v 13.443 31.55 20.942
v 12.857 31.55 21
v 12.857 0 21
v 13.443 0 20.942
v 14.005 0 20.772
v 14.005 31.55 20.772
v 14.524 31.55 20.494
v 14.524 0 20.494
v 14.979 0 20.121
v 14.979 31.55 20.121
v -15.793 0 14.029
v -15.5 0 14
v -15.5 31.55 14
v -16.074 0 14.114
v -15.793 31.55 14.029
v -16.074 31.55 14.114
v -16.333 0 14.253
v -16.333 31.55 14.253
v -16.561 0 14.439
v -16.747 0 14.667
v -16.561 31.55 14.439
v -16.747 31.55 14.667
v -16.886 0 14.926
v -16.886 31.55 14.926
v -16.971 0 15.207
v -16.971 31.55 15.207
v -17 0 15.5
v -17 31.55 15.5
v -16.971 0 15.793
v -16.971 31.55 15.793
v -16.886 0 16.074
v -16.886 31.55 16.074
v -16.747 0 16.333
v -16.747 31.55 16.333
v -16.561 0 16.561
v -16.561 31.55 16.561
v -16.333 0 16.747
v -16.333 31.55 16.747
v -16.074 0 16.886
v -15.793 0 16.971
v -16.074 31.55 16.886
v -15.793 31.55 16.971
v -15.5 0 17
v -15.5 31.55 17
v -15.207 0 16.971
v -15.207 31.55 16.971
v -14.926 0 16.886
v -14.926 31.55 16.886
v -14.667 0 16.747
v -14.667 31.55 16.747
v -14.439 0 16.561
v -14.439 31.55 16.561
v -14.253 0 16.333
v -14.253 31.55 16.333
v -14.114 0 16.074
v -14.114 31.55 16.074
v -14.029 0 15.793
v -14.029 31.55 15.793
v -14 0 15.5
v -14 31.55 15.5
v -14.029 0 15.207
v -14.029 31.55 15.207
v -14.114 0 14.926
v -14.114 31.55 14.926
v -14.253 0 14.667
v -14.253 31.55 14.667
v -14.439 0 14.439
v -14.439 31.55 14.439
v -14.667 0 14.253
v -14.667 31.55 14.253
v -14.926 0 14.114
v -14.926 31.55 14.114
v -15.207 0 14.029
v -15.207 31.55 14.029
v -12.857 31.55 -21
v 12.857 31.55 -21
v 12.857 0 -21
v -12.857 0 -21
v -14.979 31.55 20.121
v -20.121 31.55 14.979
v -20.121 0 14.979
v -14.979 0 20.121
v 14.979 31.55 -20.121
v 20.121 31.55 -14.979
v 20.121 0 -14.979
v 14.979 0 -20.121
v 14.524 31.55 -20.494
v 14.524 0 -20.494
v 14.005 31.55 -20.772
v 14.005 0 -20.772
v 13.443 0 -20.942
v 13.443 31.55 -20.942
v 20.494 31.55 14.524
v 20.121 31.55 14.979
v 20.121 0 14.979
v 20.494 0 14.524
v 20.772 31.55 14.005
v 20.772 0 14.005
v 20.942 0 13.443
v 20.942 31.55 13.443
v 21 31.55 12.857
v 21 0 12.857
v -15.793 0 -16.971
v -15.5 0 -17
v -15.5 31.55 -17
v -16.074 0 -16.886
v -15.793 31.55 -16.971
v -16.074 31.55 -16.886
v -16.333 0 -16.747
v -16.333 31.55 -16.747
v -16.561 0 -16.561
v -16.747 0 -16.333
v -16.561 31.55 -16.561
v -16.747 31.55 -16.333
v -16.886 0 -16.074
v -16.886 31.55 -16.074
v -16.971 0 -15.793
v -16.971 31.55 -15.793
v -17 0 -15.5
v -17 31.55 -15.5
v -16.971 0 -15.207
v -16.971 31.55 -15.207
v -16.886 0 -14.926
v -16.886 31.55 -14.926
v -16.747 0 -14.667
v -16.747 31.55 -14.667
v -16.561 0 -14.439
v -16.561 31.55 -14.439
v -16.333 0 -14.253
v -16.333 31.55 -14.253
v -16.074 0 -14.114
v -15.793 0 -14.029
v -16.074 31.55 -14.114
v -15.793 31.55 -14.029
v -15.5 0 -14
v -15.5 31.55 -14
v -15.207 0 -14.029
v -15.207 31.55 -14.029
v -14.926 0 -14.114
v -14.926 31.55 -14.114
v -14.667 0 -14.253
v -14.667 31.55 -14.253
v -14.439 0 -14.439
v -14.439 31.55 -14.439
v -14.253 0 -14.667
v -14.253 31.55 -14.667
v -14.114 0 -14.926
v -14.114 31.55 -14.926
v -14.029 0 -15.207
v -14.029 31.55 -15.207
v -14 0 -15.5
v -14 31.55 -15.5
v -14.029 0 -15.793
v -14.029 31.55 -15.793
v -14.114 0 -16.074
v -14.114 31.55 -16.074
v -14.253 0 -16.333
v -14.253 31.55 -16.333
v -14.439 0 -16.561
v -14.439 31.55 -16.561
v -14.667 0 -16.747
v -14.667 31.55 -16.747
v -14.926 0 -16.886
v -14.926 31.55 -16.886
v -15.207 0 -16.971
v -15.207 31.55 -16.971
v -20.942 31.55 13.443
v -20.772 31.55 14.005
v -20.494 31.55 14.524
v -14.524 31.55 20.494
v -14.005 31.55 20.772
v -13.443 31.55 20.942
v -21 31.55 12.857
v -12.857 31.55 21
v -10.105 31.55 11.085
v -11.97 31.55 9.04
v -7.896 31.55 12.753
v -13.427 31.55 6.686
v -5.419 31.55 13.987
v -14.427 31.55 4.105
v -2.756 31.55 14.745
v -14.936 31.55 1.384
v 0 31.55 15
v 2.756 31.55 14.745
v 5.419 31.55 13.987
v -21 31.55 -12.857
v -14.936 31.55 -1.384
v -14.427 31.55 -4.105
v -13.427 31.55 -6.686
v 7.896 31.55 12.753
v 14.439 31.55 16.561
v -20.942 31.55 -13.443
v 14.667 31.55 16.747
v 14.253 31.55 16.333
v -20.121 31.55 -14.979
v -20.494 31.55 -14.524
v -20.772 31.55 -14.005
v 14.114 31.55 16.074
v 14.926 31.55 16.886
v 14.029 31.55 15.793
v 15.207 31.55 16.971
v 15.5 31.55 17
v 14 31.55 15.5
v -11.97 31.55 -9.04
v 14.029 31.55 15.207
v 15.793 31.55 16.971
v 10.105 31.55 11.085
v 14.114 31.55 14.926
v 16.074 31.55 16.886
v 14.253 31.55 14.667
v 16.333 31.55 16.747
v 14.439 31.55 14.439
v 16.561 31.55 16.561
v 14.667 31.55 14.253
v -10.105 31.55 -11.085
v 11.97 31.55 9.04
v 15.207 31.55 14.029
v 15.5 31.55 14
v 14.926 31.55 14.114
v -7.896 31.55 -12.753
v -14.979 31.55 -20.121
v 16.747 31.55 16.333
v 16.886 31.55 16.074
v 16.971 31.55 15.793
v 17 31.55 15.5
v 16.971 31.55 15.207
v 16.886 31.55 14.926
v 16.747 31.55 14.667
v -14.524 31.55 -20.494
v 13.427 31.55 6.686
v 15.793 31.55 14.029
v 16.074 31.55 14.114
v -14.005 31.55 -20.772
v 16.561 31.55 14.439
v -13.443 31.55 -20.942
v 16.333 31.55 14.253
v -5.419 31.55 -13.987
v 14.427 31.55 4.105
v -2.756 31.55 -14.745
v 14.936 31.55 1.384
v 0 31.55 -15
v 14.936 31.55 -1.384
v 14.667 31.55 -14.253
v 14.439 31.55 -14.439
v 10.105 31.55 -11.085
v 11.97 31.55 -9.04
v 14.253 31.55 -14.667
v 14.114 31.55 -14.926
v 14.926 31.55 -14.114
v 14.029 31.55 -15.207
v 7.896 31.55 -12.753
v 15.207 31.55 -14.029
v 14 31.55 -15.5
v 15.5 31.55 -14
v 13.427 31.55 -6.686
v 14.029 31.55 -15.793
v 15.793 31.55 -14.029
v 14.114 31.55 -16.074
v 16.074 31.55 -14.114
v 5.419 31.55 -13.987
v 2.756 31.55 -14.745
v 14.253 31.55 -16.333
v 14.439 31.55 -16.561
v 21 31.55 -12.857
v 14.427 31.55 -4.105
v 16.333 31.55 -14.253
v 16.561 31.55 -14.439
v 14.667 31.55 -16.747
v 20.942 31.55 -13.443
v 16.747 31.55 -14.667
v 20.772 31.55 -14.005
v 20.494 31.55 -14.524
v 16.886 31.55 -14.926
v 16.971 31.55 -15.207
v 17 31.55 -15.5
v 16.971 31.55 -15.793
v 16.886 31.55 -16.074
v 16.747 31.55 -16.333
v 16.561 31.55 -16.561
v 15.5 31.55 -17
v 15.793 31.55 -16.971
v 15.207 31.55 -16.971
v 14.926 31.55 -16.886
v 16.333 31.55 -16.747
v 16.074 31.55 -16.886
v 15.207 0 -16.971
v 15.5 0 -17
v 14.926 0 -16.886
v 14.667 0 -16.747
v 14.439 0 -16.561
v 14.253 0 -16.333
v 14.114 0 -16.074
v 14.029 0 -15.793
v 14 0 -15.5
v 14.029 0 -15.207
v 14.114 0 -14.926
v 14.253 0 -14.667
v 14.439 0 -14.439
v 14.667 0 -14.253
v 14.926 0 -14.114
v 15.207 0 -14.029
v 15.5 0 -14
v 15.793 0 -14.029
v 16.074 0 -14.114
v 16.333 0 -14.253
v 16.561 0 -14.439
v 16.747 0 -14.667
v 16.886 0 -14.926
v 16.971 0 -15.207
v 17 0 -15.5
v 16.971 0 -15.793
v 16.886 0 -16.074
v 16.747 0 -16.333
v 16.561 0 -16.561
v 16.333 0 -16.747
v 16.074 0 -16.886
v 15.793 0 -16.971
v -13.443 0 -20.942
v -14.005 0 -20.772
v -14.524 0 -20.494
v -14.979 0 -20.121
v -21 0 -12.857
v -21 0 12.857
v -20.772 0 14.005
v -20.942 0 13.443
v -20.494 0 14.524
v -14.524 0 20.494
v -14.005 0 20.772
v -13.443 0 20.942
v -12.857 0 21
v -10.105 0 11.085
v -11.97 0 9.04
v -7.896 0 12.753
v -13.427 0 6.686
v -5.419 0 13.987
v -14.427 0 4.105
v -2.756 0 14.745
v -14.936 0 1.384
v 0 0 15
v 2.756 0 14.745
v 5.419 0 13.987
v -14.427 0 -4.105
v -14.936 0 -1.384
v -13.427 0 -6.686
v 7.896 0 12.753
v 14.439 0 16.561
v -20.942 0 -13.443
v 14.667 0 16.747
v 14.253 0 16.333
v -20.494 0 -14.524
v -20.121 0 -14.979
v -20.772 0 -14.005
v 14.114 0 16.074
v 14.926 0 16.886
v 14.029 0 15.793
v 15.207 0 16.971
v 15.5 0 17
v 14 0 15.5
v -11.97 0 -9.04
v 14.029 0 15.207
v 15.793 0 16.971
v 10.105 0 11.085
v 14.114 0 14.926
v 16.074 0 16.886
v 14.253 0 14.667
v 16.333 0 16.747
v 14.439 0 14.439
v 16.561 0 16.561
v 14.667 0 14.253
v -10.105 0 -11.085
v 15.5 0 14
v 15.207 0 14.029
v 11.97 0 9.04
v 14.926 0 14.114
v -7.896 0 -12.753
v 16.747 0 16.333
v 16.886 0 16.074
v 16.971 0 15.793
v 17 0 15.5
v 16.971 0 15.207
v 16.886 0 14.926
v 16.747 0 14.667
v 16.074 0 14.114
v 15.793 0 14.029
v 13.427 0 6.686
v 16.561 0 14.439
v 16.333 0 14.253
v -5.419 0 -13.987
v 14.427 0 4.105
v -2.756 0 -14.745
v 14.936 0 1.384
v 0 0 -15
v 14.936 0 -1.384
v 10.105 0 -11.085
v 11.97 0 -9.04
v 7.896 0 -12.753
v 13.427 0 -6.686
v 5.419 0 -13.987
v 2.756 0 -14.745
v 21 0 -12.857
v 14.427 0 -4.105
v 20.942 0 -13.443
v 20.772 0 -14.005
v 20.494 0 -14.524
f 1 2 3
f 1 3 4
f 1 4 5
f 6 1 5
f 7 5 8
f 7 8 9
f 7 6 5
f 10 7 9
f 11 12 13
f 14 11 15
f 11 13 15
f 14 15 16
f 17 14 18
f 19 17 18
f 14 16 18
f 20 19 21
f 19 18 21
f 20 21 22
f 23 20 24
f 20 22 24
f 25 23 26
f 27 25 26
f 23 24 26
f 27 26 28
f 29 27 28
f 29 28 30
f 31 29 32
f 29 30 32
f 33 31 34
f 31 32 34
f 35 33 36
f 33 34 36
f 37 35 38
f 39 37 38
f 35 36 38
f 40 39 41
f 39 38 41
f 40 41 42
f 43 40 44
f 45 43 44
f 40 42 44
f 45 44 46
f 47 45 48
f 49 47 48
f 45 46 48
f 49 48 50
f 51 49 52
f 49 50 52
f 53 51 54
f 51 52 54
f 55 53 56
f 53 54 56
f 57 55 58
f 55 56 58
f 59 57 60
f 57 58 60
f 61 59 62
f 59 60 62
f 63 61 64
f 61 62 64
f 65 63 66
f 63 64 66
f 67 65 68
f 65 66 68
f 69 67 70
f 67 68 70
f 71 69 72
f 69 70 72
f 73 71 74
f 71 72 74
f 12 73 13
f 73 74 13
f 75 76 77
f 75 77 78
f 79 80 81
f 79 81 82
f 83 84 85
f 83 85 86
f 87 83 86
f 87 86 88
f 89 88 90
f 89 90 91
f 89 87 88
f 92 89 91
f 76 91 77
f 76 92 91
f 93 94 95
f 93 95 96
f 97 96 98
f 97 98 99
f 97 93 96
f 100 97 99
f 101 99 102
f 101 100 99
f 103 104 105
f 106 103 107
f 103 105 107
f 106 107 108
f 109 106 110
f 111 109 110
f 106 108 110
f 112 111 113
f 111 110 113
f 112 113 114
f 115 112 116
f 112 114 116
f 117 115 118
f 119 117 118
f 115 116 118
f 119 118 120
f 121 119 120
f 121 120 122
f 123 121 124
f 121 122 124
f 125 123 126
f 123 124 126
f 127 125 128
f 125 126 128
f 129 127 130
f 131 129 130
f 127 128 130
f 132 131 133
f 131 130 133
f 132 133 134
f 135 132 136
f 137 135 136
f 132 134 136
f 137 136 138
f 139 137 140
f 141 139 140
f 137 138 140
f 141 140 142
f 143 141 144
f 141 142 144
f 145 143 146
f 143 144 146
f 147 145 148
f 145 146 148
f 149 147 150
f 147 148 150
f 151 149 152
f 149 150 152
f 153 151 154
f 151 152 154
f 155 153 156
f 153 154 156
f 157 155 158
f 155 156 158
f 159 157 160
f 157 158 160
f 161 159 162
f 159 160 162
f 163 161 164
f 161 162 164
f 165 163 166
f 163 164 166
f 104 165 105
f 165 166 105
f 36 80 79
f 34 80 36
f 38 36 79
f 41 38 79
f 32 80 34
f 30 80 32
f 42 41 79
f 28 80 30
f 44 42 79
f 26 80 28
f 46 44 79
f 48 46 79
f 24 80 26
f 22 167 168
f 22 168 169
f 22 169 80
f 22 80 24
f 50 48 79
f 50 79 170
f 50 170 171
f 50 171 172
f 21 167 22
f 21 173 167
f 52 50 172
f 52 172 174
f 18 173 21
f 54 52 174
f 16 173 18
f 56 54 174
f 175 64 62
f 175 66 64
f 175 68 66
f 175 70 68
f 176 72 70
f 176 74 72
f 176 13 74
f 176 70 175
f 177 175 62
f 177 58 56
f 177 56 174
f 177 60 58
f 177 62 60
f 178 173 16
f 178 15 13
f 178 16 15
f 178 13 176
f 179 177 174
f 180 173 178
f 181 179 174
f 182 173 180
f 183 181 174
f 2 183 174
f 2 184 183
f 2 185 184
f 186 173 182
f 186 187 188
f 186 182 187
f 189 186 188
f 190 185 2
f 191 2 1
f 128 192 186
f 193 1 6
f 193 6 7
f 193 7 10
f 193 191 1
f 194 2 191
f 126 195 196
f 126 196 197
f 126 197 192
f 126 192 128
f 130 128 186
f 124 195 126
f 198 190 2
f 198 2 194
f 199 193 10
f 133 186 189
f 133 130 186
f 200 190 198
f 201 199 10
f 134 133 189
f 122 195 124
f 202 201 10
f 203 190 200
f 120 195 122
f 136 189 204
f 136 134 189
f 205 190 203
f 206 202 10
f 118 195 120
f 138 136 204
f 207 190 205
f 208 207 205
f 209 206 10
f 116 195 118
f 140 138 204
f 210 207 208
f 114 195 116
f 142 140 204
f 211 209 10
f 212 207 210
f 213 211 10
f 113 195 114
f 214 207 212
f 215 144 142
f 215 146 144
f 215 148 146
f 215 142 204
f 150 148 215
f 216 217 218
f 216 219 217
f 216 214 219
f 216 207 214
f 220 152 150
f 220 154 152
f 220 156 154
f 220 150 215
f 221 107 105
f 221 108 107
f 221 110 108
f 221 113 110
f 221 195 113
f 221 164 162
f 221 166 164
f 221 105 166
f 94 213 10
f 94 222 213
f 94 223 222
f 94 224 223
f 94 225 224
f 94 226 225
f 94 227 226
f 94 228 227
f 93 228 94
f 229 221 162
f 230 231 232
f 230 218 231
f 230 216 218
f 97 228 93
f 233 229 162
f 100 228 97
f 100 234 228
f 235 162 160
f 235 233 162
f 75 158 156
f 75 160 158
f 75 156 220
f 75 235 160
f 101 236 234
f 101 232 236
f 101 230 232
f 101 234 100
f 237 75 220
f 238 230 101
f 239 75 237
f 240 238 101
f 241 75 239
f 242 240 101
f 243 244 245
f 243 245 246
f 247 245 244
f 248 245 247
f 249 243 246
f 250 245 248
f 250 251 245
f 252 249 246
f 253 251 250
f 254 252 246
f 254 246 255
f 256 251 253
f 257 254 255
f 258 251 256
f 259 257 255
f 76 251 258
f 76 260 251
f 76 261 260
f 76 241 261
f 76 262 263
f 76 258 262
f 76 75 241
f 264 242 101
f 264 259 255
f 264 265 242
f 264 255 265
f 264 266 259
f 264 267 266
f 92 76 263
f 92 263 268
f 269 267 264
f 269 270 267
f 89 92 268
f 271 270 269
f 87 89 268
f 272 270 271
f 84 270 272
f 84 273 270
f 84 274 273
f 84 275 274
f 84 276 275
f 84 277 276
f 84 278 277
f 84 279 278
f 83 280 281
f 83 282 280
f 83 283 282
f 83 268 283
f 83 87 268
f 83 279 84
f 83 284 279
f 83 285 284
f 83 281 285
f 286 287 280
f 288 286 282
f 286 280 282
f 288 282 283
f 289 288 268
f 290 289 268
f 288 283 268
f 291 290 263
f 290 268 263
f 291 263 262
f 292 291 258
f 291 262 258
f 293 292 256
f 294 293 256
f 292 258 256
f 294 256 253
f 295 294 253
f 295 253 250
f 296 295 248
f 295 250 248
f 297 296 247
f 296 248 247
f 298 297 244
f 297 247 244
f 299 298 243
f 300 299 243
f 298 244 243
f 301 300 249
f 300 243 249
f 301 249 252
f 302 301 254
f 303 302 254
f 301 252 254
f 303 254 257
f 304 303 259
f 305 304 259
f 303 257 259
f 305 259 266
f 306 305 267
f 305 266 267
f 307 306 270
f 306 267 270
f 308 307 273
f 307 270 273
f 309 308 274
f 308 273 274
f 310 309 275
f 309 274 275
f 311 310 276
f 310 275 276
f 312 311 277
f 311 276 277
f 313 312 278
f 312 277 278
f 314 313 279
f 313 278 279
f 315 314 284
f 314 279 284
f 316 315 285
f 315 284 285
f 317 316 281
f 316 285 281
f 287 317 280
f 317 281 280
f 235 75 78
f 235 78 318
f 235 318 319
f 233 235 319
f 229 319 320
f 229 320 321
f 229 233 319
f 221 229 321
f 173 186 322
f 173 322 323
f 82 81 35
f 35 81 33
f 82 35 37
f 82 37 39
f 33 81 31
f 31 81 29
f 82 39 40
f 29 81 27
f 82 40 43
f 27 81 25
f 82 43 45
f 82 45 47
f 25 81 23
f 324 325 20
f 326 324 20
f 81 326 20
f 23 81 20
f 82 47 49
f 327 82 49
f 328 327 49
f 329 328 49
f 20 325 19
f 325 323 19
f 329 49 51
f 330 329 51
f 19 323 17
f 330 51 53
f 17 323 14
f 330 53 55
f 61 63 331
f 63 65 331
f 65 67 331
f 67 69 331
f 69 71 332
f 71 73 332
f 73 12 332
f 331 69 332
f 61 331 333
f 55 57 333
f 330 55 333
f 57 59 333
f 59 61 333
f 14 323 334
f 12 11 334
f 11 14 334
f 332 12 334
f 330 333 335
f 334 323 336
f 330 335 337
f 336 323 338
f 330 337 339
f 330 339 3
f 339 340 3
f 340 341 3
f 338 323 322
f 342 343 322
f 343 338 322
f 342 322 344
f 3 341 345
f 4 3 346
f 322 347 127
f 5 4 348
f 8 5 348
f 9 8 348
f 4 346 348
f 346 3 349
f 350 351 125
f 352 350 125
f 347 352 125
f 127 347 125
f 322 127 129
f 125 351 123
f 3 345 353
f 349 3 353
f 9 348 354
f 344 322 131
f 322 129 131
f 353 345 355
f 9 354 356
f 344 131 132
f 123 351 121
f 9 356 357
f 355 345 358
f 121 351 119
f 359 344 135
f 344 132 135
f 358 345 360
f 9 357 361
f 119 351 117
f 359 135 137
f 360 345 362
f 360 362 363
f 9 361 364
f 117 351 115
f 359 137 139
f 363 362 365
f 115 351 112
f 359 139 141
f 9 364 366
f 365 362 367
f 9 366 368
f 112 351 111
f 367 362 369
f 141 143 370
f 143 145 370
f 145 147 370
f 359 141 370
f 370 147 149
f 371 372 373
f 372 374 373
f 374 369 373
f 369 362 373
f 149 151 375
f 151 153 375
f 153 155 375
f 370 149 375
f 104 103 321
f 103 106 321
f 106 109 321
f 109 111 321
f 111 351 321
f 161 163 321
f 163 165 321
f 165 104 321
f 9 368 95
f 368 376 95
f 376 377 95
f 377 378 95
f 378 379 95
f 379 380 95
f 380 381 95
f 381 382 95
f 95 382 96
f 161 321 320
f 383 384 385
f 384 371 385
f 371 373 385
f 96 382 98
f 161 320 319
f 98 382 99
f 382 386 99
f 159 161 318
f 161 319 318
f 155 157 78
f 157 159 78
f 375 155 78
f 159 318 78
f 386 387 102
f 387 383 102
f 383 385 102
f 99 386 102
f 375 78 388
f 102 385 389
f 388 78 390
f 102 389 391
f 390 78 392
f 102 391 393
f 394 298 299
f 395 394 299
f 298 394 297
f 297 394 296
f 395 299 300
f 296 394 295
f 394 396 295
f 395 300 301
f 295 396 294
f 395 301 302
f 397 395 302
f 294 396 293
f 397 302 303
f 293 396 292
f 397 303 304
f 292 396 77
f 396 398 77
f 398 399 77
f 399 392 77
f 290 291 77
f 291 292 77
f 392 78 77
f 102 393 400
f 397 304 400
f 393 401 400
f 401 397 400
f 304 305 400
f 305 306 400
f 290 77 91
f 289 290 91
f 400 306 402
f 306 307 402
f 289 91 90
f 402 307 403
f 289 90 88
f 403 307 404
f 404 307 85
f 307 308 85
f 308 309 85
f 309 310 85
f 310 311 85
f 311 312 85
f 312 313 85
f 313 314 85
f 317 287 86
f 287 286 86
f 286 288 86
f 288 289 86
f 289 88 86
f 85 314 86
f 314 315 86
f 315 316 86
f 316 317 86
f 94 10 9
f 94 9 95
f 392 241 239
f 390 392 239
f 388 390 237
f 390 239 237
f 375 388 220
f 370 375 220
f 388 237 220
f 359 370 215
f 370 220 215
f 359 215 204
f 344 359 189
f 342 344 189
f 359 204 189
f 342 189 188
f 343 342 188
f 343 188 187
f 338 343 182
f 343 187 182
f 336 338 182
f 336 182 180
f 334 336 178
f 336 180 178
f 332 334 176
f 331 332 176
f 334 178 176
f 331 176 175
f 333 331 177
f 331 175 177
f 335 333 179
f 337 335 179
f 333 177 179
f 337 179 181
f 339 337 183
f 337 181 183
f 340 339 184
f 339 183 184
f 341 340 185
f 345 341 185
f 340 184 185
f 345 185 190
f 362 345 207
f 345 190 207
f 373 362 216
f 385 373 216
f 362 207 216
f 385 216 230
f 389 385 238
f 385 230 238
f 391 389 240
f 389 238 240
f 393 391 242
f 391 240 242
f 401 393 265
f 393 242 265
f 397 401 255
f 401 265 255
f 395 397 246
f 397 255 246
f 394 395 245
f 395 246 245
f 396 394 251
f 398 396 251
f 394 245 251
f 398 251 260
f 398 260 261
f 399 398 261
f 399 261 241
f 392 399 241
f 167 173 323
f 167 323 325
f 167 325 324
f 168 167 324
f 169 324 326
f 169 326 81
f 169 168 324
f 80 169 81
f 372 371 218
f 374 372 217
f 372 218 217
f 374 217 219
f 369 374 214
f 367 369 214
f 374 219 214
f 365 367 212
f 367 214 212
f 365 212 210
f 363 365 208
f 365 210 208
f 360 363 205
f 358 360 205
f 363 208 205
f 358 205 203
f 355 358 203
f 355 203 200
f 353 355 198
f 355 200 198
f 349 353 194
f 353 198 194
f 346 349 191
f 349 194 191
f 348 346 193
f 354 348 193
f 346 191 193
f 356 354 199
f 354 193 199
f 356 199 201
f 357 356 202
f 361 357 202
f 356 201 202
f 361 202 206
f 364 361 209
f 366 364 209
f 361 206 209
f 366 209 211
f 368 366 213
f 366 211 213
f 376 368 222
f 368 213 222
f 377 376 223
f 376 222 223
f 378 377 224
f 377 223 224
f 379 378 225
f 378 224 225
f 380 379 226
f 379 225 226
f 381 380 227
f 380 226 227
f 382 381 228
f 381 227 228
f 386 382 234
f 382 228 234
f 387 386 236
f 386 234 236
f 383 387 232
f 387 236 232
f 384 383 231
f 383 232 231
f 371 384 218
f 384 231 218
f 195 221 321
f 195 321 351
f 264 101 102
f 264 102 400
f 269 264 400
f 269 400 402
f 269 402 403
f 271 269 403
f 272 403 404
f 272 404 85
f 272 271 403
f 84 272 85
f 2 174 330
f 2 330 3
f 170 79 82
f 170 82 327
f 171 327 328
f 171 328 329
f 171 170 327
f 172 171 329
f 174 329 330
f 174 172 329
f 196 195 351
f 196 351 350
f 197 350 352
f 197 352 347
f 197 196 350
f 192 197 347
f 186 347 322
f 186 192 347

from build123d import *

# Parameters (mm, degrees)
CROQUIS1_R              = 1.5
CROQUIS1_R_2            = 15
SALIENTE_EXTRUIR1_DEPTH = 31.55


with BuildPart() as part:
    # Croquis1 → Saliente-Extruir1 (new body)
    with BuildSketch(Plane(origin=(0, 31.55, 0), x_dir=(1, 0, 0), z_dir=(0, 1, 0))):
        with BuildLine():
            Line((-12.857359313, -21), (12.857359313, -21))
            ThreePointArc((12.857359313, -21), (14.00540961, -20.771638598), (14.978679656, -20.121320344))
            Line((14.978679656, -20.121320344), (20.121320344, -14.978679656))
            ThreePointArc((20.121320344, -14.978679656), (20.771638598, -14.00540961), (21, -12.857359313))
            Line((21, -12.857359313), (21, 12.857359313))
            ThreePointArc((21, 12.857359313), (20.771638598, 14.00540961), (20.121320344, 14.978679656))
            Line((20.121320344, 14.978679656), (14.978679656, 20.121320344))
            ThreePointArc((14.978679656, 20.121320344), (14.00540961, 20.771638598), (12.857359313, 21))
            Line((12.857359313, 21), (-12.857359313, 21))
            ThreePointArc((-12.857359313, 21), (-14.00540961, 20.771638598), (-14.978679656, 20.121320344))
            Line((-14.978679656, 20.121320344), (-20.121320344, 14.978679656))
            ThreePointArc((-20.121320344, 14.978679656), (-20.771638598, 14.00540961), (-21, 12.857359313))
            Line((-21, 12.857359313), (-21, -12.857359313))
            ThreePointArc((-21, -12.857359313), (-20.771638598, -14.00540961), (-20.121320344, -14.978679656))
            Line((-20.121320344, -14.978679656), (-14.978679656, -20.121320344))
            ThreePointArc((-14.978679656, -20.121320344), (-14.00540961, -20.771638598), (-12.857359313, -21))
        make_face()
        with Locations(Location((15.5, -15.5, 0), (0, 0, 90))):
            Circle(CROQUIS1_R, mode=Mode.SUBTRACT)
        with Locations(Location((0, 0, 0), (0, 0, 90))):
            Circle(CROQUIS1_R_2, mode=Mode.SUBTRACT)
        with Locations(Location((15.5, 15.5, 0), (0, 0, 90))):
            Circle(CROQUIS1_R, mode=Mode.SUBTRACT)
        with Locations(Location((-15.5, -15.5, 0), (0, 0, 90))):
            Circle(CROQUIS1_R, mode=Mode.SUBTRACT)
        with Locations(Location((-15.5, 15.5, 0), (0, 0, 90))):
            Circle(CROQUIS1_R, mode=Mode.SUBTRACT)
    extrude(amount=-SALIENTE_EXTRUIR1_DEPTH)


solid = part.part
